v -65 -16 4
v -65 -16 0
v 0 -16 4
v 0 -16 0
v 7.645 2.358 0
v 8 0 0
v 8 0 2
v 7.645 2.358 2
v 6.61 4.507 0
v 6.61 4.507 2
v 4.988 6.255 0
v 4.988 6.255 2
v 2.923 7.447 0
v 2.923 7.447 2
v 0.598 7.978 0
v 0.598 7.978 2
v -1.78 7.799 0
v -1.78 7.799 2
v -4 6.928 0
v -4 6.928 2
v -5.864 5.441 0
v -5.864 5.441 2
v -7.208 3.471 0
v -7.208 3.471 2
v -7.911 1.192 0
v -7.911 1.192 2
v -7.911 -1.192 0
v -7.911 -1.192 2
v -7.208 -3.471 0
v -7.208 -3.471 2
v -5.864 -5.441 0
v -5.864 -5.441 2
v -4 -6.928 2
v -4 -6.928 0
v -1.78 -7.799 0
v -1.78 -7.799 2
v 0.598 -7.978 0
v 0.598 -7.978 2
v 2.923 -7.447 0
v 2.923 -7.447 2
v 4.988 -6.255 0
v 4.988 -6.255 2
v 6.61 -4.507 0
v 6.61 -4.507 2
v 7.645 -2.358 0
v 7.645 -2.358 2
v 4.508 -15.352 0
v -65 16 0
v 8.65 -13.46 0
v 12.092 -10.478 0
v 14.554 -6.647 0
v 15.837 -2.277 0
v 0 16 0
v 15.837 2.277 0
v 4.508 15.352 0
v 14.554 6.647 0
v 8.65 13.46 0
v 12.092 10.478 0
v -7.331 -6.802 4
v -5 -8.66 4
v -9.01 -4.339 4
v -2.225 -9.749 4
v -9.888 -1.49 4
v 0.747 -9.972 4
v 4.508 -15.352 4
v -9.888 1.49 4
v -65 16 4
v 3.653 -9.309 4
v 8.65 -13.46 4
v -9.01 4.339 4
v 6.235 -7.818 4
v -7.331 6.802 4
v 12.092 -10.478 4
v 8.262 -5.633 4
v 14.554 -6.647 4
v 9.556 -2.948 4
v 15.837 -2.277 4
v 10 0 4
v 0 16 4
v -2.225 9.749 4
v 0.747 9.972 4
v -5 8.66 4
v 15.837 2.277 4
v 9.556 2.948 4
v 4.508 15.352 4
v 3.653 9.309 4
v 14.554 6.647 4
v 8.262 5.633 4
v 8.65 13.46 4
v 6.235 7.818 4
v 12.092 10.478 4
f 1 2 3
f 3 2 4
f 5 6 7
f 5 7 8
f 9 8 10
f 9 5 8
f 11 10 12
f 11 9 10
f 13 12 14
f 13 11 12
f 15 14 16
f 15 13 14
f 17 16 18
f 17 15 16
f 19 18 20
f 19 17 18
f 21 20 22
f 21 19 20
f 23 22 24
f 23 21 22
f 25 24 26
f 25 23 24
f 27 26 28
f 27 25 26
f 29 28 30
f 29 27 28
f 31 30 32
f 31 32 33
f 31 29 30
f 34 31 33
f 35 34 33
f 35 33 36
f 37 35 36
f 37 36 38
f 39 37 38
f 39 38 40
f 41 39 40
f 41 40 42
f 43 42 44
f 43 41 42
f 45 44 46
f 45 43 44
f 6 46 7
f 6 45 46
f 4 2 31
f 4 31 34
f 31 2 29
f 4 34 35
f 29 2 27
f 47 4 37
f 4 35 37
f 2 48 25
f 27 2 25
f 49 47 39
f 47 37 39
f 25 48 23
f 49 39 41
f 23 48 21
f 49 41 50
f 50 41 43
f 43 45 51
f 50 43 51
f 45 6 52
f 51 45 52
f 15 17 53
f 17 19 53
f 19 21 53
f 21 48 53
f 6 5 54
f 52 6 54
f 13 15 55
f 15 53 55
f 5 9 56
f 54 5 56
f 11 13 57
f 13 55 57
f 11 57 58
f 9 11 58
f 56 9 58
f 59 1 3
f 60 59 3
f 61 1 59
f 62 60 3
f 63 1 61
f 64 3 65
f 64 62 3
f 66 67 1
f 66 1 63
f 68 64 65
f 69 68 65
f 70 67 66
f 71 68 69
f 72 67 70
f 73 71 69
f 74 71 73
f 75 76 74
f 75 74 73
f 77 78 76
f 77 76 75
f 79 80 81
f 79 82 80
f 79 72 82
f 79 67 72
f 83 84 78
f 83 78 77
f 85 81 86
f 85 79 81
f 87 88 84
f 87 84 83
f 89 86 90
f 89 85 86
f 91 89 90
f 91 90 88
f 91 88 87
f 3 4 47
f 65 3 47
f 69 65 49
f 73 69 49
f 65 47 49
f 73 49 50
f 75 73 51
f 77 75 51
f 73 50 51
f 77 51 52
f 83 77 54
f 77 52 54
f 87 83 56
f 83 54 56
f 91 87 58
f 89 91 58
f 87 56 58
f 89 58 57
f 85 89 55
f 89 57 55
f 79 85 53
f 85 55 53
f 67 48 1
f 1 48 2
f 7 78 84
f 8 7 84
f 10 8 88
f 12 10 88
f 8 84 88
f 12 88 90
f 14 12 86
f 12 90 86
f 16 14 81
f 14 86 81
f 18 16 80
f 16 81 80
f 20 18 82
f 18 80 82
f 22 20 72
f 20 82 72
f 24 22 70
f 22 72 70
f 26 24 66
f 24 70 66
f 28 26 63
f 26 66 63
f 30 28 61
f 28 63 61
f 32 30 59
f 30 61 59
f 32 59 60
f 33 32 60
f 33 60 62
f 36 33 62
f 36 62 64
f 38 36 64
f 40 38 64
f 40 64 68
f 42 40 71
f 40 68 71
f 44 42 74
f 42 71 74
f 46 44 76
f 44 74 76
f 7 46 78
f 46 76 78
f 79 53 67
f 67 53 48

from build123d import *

# Parameters (mm, degrees)
SKETCH_1_R             = 8
SM_BASE_FLANGE_1_DEPTH = 4
CHAMFER_1_SIZE         = 2


# Sheet-metal steps are written as plain solids
with BuildPart() as part:
    # Sketch 1 → Базовая кромка1 (new body)
    with BuildSketch(Plane.XY):
        with BuildLine():
            Line((0, 16), (-65, 16))
            Line((-65, 16), (-65, -16))
            Line((-65, -16), (0, -16))
            ThreePointArc((0, -16), (16, 0), (0, 16))
        make_face()
        Circle(SKETCH_1_R, mode=Mode.SUBTRACT)
    extrude(amount=SM_BASE_FLANGE_1_DEPTH)

    # Фаска1
    chamfer_1_edges = [part.edges().sort_by_distance(p)[0] for p in [
        (-8, 0, 4),
    ]]
    chamfer(chamfer_1_edges, length=CHAMFER_1_SIZE)


solid = part.part
